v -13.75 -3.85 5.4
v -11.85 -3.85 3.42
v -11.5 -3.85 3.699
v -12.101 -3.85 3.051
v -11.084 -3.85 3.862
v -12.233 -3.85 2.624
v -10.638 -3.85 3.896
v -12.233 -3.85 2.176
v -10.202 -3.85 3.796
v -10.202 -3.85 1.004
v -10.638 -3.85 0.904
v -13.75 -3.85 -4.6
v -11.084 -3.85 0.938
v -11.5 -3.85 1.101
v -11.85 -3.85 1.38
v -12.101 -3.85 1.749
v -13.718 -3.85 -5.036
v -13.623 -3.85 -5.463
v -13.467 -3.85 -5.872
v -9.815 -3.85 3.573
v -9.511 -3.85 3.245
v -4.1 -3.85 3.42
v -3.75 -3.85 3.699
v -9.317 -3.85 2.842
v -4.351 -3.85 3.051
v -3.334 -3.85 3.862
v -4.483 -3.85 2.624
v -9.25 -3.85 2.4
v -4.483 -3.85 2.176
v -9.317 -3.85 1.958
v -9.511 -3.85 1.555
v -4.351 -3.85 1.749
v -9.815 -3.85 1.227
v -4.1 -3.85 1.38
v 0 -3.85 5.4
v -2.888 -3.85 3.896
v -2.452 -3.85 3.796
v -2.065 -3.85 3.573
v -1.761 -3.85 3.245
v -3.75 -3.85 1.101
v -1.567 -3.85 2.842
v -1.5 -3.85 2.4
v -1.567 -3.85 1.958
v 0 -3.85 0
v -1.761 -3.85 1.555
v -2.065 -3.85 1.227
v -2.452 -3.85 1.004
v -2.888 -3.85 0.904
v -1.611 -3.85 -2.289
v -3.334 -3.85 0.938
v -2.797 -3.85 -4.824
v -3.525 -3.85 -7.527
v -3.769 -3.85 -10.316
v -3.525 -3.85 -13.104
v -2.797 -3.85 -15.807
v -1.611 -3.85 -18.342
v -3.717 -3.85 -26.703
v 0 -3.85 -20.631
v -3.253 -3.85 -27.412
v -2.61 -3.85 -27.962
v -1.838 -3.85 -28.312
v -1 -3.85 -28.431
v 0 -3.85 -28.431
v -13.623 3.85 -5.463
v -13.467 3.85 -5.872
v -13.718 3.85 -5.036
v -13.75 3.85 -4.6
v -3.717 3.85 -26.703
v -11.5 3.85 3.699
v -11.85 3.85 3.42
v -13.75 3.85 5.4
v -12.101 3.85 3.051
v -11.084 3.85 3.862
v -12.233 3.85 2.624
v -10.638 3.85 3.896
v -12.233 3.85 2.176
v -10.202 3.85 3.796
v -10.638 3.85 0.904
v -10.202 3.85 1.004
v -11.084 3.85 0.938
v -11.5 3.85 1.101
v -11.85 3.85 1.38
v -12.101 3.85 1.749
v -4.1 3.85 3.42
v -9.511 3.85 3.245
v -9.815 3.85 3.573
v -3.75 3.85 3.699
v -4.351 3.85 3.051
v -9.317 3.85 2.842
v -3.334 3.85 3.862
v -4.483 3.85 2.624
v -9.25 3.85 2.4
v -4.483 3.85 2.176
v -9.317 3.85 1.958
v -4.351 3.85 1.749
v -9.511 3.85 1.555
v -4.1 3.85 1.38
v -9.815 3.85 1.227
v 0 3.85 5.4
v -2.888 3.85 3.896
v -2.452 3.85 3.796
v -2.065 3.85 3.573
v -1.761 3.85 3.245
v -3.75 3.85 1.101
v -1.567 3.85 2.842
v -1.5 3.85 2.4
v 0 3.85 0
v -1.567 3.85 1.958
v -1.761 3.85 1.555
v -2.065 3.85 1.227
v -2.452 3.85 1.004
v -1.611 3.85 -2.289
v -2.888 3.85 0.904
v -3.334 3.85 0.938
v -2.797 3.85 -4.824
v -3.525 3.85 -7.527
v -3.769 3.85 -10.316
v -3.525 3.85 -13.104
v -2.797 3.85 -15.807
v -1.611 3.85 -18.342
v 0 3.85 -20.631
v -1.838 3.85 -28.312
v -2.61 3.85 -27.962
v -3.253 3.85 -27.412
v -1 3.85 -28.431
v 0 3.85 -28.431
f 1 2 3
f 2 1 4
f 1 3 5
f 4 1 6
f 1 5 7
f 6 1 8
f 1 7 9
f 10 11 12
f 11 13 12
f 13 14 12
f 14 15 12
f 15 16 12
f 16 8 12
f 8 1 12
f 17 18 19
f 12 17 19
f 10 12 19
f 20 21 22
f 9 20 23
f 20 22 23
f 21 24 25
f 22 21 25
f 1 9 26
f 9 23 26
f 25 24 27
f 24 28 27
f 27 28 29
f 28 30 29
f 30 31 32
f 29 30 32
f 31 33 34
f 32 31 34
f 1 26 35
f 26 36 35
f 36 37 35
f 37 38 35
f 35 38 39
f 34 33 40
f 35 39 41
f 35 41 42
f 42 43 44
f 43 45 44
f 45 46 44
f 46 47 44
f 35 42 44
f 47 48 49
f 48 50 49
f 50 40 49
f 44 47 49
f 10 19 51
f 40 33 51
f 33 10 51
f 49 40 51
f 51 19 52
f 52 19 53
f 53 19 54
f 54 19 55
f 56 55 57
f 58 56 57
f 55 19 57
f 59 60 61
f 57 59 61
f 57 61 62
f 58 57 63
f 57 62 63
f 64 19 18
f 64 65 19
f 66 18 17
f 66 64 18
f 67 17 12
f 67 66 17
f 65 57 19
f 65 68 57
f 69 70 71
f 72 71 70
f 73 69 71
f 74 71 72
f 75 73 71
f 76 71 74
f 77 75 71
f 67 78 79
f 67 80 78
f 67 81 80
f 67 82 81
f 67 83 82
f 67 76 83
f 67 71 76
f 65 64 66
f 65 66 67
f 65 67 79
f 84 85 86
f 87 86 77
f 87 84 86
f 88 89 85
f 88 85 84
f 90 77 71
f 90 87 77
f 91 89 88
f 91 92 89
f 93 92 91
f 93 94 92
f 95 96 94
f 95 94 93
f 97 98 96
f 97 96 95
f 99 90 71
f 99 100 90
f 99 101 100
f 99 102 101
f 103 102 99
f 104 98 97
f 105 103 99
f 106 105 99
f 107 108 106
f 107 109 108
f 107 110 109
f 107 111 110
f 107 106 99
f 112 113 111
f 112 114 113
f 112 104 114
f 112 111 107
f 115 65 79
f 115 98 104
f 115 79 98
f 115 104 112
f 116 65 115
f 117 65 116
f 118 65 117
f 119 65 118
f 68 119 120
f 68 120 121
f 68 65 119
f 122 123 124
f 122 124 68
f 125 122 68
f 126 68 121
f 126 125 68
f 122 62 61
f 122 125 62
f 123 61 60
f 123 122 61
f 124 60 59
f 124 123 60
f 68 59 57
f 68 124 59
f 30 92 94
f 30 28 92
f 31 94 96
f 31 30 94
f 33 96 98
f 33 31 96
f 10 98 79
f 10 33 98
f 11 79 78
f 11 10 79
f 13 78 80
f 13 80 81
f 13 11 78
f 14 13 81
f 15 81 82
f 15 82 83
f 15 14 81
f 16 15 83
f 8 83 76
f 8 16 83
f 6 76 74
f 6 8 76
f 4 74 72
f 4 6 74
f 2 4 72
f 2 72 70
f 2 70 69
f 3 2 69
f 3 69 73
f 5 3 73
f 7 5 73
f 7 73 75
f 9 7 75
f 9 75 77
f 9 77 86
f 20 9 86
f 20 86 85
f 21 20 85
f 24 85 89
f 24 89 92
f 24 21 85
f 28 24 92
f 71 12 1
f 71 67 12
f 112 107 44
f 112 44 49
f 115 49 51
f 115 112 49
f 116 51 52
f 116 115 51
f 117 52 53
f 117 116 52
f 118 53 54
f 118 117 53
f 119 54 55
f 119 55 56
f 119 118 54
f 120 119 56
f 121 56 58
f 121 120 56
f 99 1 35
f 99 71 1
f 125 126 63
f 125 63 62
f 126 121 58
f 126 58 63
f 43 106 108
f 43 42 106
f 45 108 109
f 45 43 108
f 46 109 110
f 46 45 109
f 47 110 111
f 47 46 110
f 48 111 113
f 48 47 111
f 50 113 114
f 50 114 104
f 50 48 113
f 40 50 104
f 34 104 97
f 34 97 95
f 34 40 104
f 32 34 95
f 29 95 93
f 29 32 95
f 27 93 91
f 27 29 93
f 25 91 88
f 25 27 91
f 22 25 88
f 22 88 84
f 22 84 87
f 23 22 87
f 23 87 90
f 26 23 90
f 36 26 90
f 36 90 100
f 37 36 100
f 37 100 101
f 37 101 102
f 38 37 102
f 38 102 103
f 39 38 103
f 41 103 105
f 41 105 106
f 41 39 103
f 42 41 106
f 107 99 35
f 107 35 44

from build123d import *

# Parameters (mm, degrees)
SKETCH1_R           = 1.5
BOSS_EXTRUDE3_DEPTH = 3.85


with BuildPart() as part:
    # Sketch1 → Boss-Extrude3 (new body, symmetric)
    with BuildSketch(Plane(origin=(0, 0, 0), x_dir=(1, 0, 0), z_dir=(0, 1, 0))):
        with BuildLine():
            Line((-13.75, -5.4), (0, -5.4))
            Line((0, -5.4), (0, 0))
            ThreePointArc((0, 0), (-3.769352362, 10.315583277), (0, 20.631166554))
            Line((0, 20.631166554), (0, 28.431166554))
            Line((0, 28.431166554), (-1, 28.431166554))
            ThreePointArc((-1, 28.431166554), (-2.610090465, 27.962492036), (-3.717108681, 26.702905684))
            Line((-3.717108681, 26.702905684), (-13.467108681, 5.87173913))
            ThreePointArc((-13.467108681, 5.87173913), (-13.6784233, 5.251411528), (-13.75, 4.6))
            Line((-13.75, 4.6), (-13.75, -5.4))
        make_face()
        with Locations((-10.75, -2.4)):
            Circle(SKETCH1_R, mode=Mode.SUBTRACT)
        with Locations((-3, -2.4)):
            Circle(SKETCH1_R, mode=Mode.SUBTRACT)
    extrude(amount=BOSS_EXTRUDE3_DEPTH, both=True)


solid = part.part
